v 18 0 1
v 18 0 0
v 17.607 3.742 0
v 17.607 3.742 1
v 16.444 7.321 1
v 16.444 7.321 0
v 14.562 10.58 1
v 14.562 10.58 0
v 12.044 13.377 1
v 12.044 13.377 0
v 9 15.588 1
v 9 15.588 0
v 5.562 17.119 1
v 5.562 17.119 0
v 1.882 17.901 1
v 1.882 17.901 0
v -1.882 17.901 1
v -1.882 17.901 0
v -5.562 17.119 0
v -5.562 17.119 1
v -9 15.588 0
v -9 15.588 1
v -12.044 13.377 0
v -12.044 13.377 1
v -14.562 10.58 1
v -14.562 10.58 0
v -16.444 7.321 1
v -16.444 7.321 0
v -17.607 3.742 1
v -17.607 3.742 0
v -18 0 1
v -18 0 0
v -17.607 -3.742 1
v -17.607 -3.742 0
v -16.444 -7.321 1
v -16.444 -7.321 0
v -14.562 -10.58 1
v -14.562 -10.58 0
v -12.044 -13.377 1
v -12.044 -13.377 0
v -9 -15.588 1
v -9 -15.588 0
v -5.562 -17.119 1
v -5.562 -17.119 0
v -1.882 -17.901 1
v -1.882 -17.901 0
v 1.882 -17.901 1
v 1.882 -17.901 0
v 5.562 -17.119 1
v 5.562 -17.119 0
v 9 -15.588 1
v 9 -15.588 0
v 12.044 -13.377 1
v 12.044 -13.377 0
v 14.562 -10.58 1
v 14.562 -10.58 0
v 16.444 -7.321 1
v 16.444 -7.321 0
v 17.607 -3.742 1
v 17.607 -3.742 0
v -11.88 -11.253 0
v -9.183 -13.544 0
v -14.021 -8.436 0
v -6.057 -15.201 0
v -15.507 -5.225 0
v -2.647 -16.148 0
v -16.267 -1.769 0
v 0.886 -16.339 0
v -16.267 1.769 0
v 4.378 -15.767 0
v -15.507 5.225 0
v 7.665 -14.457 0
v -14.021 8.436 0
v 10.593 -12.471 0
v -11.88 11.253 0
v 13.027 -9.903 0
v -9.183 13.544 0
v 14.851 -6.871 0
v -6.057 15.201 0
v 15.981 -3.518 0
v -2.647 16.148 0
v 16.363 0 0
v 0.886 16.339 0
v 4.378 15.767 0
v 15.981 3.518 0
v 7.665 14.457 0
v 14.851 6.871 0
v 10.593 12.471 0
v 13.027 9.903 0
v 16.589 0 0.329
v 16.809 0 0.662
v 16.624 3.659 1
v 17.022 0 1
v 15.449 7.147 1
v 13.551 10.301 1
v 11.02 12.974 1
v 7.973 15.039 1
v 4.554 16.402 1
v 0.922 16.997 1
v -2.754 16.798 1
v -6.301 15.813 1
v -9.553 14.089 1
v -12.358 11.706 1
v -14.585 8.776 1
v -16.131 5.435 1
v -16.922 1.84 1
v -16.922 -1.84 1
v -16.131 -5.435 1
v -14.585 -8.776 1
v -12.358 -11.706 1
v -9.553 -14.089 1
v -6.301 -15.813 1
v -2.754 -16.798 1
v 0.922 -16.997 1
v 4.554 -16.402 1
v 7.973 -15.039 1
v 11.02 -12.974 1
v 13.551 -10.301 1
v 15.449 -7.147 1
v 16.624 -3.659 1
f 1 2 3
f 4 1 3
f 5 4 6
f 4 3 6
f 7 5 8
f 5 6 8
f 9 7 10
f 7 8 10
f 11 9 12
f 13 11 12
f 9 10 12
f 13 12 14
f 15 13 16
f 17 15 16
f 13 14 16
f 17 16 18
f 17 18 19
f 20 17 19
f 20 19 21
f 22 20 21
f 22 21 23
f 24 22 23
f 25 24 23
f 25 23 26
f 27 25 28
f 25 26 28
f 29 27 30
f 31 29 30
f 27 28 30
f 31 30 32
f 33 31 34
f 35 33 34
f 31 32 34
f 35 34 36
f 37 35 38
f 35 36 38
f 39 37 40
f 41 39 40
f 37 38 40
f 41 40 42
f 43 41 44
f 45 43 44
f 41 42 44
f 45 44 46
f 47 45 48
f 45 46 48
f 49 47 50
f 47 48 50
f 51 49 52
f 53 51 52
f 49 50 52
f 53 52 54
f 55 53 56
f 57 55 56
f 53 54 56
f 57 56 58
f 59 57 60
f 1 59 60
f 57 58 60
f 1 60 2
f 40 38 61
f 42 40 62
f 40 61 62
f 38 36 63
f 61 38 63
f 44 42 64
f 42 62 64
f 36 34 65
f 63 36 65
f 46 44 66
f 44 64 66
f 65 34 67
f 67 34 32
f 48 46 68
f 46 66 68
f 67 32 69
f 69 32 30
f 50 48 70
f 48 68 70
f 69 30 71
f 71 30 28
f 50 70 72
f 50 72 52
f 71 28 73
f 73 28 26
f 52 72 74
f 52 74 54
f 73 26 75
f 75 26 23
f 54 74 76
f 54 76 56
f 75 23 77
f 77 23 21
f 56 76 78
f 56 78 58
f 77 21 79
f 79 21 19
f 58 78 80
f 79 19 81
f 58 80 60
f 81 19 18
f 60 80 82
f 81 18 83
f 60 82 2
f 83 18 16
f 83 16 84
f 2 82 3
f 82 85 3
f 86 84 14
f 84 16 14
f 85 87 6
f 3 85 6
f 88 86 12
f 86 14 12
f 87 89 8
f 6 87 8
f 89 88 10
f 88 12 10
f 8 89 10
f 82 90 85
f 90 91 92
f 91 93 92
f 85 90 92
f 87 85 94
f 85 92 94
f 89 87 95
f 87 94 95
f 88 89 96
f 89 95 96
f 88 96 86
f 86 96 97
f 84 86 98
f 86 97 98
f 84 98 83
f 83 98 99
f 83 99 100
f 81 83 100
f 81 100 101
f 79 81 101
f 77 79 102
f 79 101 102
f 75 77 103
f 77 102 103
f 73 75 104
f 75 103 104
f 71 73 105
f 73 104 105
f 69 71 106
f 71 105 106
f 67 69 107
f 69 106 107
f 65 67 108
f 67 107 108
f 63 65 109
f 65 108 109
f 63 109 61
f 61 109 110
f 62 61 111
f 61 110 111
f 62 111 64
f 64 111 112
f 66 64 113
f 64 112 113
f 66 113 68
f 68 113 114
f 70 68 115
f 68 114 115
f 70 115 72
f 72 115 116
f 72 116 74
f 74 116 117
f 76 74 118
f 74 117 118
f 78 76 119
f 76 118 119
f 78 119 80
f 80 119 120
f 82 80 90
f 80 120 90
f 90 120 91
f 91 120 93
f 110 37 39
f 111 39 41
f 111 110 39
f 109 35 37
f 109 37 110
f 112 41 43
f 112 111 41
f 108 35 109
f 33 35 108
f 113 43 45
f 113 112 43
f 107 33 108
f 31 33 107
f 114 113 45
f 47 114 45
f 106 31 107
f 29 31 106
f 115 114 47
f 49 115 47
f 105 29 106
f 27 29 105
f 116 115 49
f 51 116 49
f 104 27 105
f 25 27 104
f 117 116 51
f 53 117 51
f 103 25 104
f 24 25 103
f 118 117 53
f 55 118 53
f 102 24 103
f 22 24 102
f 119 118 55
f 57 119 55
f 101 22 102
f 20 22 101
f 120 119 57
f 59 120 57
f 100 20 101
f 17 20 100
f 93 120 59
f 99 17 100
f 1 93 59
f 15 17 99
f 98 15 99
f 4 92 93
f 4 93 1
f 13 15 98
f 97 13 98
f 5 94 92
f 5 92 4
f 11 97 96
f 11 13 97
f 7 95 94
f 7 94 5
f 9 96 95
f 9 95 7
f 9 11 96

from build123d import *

# Parameters (mm, degrees)
SKETCH_R  = 18
PAD_DEPTH = 1


with BuildPart() as sphere:
    # Sphere → Sphere (revolve)
    with BuildSketch(Plane(origin=(0, 0, 11.5), x_dir=(1, 0, 0), z_dir=(0, -1, 0))):
        with BuildLine():
            ThreePointArc((0, -20), (20, 0), (0, 20))
            Line((0, 20), (0, -20))
        make_face()
    revolve(axis=Axis((0, 0, 11.5), (0, 0, 1)))


with BuildPart() as cut:
    # Sketch → Pad (new body)
    with BuildSketch(Plane.XY):
        Circle(SKETCH_R)
    extrude(amount=PAD_DEPTH)

    # Cut: cut Sphere
    add(sphere.part, mode=Mode.SUBTRACT)


solid = cut.part
